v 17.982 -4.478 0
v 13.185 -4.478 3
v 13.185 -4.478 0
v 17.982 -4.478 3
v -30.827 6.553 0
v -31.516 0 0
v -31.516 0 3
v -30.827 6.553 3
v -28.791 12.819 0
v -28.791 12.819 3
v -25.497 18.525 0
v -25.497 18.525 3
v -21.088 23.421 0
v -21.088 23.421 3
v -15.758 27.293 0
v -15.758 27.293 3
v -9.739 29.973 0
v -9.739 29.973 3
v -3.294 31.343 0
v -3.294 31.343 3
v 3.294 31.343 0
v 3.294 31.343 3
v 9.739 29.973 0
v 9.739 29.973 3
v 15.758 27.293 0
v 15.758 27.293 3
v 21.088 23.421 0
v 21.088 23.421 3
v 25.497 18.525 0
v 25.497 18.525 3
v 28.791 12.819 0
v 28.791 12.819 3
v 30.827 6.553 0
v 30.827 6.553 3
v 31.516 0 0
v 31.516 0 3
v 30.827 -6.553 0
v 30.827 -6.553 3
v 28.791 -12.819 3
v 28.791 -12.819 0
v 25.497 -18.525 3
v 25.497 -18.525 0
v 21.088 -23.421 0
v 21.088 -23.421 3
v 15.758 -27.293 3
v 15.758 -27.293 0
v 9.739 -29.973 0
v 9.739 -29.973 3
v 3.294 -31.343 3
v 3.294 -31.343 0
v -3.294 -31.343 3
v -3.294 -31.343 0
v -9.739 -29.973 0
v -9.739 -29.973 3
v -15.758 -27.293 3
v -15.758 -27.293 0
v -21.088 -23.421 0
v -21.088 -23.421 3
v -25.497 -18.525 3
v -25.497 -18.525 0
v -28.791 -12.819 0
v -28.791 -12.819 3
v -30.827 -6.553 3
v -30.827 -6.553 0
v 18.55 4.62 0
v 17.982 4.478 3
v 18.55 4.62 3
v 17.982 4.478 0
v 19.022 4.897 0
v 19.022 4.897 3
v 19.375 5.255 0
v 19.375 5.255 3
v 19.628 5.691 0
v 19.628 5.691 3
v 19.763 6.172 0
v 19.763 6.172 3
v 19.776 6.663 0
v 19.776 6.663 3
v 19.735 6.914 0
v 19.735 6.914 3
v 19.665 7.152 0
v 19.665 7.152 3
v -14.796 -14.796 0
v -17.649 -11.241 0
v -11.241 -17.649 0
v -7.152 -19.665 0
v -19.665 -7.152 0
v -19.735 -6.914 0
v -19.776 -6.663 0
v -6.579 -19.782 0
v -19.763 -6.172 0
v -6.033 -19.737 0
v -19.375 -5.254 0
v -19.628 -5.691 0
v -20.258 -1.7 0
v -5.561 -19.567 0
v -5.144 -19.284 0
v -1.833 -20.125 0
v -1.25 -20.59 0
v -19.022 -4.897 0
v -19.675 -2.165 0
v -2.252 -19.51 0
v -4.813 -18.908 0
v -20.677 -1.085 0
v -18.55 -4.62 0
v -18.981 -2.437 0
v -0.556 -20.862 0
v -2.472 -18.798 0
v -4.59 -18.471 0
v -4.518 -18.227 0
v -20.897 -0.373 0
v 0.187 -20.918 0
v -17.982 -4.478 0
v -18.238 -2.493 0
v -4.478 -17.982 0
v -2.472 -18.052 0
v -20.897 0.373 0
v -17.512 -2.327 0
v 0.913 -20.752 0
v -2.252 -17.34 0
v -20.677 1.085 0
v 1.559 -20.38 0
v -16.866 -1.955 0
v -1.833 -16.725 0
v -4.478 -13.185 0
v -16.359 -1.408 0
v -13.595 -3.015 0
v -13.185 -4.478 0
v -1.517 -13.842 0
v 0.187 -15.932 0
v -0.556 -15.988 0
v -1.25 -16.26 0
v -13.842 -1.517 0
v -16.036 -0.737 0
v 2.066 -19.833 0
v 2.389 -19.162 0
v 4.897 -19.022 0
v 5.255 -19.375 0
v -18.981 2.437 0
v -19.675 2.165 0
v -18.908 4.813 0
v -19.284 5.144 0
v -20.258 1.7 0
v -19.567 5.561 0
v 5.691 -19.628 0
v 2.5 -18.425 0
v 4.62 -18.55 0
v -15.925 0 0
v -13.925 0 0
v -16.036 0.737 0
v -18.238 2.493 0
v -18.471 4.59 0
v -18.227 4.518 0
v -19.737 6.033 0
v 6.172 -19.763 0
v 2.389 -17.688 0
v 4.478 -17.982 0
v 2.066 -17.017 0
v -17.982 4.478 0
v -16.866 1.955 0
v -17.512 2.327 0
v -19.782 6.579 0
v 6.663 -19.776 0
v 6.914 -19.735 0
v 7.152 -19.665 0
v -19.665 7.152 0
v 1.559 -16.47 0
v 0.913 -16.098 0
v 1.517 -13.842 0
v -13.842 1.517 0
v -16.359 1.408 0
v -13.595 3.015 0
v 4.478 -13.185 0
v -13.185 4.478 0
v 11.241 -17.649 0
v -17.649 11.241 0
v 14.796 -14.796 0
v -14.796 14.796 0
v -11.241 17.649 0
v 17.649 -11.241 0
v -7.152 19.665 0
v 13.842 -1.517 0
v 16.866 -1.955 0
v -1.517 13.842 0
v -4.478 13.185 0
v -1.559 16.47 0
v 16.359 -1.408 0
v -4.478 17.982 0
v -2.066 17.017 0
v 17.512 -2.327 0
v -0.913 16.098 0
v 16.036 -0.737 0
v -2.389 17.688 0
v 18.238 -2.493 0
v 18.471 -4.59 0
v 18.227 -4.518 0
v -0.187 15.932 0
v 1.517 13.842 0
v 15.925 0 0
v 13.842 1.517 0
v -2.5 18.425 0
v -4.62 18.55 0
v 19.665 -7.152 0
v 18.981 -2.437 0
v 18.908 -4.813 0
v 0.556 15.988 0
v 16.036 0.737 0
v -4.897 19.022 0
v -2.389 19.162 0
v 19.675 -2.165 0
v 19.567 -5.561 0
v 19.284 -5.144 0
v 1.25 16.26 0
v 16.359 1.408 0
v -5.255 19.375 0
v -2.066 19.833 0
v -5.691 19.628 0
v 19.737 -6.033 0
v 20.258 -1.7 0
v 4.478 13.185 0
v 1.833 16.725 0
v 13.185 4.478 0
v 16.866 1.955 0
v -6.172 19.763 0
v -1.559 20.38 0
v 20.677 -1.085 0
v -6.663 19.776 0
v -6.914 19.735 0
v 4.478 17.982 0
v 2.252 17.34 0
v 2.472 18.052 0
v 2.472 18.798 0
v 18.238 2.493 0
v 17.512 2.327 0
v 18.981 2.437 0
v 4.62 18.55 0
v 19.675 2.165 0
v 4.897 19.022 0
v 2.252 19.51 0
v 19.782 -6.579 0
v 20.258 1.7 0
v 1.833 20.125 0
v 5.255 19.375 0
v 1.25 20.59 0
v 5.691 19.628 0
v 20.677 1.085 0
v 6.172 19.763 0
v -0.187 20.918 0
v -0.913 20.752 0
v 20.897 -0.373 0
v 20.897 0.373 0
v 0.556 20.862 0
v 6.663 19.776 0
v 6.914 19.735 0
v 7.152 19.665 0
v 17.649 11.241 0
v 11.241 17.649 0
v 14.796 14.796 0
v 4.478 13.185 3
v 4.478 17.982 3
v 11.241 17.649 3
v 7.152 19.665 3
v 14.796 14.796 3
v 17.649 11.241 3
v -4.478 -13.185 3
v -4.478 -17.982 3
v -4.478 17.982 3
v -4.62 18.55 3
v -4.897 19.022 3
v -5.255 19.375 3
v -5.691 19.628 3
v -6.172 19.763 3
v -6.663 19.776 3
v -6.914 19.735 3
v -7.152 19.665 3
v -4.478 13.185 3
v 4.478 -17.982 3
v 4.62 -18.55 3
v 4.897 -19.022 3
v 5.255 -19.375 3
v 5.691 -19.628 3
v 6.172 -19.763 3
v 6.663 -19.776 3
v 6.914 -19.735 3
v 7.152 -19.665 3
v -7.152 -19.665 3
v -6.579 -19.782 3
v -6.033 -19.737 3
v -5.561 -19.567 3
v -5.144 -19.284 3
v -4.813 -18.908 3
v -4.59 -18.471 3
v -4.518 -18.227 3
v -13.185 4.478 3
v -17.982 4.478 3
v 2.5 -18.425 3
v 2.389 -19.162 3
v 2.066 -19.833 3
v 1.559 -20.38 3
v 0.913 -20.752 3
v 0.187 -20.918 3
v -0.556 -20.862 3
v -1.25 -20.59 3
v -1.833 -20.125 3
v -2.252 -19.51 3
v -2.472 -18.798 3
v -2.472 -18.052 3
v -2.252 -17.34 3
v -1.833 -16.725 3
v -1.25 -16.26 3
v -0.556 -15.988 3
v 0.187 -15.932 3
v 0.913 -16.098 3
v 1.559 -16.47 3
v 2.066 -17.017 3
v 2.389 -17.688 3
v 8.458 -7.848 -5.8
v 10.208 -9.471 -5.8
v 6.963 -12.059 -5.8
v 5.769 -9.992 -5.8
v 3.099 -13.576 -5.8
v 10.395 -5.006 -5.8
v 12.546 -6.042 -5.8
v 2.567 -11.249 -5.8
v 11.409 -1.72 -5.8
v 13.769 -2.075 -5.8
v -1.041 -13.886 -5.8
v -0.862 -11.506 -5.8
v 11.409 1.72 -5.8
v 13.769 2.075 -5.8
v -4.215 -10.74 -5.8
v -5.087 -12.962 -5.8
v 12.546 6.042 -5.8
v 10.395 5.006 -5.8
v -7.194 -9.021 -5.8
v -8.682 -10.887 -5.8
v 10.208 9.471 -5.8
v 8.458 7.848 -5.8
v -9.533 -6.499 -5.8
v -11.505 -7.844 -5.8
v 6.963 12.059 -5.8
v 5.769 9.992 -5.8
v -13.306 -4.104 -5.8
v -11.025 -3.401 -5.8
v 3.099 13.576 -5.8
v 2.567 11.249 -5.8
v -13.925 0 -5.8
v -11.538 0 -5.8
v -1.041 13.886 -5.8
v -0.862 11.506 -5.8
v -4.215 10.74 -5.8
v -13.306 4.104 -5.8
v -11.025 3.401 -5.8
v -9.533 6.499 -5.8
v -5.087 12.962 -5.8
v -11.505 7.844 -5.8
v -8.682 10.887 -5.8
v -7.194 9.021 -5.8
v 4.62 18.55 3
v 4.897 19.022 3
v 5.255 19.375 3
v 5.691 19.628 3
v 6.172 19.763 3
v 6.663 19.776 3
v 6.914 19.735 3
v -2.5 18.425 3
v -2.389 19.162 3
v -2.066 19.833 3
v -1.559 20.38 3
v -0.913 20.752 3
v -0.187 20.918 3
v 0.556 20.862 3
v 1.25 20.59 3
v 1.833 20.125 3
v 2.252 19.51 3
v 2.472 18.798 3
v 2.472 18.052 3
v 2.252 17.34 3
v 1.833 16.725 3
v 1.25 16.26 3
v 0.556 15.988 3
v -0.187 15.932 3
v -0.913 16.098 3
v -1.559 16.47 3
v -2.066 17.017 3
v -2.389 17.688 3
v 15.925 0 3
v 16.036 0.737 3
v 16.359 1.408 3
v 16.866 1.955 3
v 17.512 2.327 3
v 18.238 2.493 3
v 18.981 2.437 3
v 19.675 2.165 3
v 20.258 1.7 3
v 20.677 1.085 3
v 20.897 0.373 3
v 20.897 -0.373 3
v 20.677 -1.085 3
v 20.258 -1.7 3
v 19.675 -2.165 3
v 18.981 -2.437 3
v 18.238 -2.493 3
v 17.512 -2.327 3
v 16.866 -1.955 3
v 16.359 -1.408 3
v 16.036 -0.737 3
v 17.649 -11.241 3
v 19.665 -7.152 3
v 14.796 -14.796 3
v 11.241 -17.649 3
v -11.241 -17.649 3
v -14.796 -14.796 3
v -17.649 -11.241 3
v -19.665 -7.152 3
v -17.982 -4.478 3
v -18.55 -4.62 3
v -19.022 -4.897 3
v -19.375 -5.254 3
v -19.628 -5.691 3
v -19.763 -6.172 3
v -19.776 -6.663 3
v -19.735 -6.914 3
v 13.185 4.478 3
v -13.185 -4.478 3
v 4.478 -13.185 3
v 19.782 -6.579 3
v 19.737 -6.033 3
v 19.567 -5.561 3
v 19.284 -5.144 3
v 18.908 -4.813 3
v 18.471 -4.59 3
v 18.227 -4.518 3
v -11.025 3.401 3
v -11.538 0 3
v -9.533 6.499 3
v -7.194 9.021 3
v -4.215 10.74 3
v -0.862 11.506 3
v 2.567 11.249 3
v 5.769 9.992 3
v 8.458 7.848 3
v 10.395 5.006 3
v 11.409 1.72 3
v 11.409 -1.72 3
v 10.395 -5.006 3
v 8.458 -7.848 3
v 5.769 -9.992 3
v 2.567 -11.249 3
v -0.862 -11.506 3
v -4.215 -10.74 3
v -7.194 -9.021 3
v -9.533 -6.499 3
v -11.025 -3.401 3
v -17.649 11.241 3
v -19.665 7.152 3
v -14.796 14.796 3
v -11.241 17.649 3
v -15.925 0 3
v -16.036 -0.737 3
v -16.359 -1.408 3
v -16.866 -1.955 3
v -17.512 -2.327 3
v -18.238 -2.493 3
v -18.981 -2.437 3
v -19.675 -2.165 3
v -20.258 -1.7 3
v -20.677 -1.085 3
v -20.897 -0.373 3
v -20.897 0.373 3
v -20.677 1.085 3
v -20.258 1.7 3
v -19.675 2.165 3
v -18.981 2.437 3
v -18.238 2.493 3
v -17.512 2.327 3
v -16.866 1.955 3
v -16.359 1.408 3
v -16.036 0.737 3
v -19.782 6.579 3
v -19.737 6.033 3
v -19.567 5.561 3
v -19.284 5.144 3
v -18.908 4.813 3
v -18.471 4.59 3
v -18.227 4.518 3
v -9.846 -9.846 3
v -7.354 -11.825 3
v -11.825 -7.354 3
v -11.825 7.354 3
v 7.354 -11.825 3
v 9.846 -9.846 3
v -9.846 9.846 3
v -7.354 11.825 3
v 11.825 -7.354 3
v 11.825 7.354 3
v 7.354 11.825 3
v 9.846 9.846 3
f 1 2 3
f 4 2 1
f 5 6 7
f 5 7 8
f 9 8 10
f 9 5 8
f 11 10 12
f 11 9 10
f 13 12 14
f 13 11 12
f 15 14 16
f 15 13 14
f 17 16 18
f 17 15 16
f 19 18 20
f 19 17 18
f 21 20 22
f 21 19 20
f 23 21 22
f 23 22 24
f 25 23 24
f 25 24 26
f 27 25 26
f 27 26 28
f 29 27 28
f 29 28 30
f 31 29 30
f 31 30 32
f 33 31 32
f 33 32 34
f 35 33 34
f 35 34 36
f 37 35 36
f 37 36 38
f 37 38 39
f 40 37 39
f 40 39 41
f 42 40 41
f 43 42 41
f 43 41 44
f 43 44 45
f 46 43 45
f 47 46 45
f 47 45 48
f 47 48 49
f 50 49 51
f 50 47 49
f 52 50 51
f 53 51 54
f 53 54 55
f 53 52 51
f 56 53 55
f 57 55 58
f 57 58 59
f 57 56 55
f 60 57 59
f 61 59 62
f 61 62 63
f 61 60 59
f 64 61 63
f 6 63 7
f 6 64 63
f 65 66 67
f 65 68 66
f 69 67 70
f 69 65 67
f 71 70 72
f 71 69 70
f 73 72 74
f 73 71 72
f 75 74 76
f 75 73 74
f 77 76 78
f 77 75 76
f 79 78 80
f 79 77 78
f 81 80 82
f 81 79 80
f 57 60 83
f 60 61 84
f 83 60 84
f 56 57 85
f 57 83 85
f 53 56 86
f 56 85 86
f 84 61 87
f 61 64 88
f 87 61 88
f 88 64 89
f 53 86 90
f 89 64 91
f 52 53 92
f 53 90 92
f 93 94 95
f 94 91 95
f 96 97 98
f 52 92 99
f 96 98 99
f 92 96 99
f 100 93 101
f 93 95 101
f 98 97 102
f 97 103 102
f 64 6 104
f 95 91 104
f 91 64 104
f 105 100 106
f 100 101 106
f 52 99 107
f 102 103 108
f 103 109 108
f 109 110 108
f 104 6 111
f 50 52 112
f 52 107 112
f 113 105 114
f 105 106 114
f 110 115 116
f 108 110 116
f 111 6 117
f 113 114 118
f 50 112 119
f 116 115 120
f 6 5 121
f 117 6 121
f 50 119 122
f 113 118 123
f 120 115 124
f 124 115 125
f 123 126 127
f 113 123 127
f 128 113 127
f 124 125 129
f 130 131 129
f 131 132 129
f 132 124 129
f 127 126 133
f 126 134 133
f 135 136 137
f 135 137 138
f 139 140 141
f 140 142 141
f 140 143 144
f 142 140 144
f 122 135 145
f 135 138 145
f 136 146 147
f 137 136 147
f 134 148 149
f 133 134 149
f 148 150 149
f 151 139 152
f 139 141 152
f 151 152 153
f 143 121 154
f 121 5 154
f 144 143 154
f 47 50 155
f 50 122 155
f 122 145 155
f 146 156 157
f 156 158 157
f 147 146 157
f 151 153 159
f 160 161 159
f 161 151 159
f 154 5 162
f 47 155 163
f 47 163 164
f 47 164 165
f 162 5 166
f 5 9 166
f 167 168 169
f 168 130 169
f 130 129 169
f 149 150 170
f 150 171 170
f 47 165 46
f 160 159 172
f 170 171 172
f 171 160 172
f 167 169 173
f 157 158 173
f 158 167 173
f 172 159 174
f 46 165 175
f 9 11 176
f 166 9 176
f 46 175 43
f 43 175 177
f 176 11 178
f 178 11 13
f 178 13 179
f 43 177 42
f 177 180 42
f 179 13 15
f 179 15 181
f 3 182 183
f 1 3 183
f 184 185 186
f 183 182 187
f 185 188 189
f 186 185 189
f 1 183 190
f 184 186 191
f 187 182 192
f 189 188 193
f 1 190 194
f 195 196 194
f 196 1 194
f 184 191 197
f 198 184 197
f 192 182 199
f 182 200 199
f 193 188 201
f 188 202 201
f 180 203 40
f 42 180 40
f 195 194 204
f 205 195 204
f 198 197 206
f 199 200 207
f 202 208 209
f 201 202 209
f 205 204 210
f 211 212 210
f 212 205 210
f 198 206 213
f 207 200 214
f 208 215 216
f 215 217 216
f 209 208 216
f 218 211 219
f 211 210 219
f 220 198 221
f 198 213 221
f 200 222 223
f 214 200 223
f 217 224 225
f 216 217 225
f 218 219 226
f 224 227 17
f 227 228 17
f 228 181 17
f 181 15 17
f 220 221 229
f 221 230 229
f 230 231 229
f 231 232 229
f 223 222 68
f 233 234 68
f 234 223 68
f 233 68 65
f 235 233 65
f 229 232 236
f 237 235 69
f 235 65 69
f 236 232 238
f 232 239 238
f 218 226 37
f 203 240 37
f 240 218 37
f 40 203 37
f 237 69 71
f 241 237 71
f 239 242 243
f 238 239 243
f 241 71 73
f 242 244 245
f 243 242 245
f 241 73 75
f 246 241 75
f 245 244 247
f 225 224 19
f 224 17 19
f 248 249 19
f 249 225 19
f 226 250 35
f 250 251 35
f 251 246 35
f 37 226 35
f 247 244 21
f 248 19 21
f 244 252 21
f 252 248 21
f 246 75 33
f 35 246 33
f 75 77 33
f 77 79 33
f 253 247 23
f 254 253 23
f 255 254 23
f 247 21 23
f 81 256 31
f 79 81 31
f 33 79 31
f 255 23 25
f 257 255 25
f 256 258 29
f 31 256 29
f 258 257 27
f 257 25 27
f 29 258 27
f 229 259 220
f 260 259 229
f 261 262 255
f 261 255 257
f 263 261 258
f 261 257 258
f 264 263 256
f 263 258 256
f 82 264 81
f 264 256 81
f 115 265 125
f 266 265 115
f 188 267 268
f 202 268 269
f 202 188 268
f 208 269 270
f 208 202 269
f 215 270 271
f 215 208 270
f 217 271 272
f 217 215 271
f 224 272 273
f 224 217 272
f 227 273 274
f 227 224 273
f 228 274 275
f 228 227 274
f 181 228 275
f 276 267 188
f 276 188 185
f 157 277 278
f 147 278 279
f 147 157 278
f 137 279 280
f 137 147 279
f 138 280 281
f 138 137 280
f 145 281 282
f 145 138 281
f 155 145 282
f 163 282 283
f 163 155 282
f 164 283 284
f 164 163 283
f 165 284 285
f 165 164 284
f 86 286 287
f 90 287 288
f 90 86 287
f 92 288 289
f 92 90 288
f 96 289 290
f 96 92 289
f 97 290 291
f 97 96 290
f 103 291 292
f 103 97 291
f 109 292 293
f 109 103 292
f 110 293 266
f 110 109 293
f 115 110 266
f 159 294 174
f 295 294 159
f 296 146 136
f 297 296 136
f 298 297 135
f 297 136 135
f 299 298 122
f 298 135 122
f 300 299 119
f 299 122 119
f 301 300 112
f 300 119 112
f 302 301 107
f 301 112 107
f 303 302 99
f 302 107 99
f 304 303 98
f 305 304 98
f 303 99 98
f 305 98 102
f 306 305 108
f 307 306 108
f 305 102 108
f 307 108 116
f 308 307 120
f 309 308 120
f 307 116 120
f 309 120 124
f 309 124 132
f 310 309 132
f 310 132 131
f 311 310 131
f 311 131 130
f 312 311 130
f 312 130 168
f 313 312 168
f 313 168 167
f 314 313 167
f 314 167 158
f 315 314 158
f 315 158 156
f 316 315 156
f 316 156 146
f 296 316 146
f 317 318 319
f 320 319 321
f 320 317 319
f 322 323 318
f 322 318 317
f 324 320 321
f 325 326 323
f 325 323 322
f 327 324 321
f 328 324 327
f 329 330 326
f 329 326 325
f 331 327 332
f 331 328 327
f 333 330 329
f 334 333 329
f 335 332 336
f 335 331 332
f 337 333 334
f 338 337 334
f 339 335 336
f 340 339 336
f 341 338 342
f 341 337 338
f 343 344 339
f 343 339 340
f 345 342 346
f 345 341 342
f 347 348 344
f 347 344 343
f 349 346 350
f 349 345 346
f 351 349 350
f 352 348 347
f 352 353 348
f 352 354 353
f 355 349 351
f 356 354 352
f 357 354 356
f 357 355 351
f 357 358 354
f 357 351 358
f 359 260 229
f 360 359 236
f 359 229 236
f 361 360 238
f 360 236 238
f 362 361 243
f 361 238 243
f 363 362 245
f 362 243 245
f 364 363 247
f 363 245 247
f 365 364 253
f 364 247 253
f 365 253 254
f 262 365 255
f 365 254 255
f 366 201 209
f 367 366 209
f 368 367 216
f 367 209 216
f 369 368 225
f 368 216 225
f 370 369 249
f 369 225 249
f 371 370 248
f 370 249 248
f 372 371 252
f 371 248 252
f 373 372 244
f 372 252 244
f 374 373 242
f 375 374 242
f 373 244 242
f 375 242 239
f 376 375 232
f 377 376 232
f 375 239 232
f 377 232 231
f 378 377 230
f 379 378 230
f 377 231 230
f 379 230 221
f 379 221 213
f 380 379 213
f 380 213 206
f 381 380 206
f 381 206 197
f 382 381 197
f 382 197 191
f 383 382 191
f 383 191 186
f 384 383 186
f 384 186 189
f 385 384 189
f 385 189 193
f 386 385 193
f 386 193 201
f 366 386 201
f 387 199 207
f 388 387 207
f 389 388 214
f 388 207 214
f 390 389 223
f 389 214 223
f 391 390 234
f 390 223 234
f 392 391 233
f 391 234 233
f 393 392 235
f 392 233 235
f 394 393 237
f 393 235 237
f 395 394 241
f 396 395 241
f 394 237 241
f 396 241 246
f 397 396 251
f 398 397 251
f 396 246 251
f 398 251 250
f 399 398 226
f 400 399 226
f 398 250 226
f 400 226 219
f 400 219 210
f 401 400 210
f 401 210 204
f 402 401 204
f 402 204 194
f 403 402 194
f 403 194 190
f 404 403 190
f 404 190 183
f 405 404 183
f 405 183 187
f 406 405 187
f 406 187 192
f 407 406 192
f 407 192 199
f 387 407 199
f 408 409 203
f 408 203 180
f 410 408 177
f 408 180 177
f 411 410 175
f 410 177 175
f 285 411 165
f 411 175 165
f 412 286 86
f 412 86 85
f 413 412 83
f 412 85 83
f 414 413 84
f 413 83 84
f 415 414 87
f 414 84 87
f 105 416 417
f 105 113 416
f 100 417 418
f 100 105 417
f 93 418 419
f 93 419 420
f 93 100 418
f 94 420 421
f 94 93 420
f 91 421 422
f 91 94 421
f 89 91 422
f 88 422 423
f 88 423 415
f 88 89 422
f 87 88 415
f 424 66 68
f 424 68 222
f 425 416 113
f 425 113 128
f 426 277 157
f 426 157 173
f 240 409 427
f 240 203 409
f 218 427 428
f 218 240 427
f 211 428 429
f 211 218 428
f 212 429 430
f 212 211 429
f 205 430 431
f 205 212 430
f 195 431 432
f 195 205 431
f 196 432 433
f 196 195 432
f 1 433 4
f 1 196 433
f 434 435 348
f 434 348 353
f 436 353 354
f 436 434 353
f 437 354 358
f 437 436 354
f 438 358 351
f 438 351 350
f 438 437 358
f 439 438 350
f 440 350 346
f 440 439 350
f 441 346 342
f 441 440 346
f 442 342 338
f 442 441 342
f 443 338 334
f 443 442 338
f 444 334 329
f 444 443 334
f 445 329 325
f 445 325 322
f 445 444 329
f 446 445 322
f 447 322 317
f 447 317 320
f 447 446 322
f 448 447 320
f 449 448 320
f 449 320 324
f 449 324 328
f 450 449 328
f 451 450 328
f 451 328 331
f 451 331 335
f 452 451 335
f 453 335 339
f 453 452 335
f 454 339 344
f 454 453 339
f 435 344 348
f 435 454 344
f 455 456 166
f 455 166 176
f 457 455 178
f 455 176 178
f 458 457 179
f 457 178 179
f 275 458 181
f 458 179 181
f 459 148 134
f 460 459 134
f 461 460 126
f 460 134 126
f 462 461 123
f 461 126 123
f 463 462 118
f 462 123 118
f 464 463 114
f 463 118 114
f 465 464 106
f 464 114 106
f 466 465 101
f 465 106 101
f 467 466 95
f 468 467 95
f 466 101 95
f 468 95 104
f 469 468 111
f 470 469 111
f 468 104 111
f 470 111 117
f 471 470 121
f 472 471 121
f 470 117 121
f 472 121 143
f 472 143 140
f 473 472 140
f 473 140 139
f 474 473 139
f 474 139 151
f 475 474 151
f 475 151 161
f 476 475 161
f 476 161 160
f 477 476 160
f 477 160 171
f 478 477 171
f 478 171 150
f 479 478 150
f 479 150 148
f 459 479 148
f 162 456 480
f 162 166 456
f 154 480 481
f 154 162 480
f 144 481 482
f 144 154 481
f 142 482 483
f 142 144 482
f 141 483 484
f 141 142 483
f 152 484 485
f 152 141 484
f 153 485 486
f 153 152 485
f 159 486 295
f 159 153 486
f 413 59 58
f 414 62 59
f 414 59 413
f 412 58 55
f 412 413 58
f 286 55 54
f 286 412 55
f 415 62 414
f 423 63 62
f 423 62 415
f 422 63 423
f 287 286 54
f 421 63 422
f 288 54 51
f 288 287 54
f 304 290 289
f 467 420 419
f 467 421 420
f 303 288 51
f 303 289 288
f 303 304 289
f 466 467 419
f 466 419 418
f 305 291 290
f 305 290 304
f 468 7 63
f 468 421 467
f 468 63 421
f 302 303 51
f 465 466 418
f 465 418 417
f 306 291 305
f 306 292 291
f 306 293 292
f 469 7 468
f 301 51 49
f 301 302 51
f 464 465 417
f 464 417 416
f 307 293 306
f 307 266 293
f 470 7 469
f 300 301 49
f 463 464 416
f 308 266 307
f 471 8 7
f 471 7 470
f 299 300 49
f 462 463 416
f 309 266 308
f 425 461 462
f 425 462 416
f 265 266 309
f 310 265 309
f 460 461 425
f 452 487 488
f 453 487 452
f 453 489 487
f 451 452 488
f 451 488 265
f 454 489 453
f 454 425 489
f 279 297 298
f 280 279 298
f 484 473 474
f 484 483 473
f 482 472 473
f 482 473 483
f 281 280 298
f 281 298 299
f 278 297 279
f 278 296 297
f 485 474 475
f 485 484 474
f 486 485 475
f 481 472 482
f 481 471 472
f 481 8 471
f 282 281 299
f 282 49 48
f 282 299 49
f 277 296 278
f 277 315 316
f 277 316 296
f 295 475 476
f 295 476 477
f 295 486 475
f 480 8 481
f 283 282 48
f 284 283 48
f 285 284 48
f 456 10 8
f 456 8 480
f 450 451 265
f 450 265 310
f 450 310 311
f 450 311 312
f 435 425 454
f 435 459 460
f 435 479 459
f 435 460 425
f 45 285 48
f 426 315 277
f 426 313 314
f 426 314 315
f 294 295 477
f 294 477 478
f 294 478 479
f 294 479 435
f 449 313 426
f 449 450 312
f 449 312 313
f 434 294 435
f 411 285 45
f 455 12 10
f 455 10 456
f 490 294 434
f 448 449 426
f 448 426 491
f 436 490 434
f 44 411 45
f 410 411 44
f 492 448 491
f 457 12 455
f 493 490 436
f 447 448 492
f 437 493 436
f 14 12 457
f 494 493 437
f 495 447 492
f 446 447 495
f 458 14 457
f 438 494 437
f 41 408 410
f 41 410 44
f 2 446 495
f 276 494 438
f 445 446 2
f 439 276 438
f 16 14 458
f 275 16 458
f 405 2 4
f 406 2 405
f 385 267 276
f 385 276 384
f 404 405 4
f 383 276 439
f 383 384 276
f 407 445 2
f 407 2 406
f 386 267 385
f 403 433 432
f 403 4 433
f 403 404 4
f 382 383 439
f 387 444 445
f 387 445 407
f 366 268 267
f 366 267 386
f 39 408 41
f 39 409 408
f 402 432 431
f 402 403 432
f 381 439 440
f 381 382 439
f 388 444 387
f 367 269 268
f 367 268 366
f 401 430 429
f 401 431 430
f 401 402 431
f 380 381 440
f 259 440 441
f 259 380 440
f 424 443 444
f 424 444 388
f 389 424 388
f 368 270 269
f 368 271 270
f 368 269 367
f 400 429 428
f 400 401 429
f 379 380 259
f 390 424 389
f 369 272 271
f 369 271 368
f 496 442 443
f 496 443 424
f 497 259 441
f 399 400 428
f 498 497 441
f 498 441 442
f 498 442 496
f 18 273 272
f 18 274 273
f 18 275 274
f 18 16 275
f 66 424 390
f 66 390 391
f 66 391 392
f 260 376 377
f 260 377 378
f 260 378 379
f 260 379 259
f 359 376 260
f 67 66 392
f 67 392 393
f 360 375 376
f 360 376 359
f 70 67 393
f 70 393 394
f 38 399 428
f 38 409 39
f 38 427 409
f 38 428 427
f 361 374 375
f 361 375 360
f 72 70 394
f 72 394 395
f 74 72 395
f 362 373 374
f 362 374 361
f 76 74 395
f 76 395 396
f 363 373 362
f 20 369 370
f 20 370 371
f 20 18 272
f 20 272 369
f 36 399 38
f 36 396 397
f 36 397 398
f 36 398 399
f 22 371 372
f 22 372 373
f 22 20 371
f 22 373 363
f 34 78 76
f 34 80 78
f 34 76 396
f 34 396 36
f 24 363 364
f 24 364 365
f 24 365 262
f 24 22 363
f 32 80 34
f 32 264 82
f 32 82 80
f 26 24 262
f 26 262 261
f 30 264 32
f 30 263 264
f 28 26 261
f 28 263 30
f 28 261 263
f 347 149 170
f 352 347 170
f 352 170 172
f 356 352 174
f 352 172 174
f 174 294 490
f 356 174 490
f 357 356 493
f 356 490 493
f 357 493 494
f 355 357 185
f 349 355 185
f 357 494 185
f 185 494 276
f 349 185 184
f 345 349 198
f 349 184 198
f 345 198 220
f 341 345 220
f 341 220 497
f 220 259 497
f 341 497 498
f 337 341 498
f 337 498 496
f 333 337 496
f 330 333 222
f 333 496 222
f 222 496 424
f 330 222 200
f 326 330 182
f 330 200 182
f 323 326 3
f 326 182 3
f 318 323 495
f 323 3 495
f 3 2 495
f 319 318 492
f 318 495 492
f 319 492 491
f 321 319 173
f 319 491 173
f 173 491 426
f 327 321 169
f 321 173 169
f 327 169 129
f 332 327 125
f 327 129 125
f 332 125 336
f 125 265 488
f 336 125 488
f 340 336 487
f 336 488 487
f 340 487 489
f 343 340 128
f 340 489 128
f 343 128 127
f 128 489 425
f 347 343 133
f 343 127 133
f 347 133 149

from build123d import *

# Parameters (mm, degrees)
SKETCH2_R                = 52.5
SKETCH2_R_2              = 4.1
BOSS_EXTRUDE1_DEPTH      = 3
SKETCH3_R                = 20.925
CUT_EXTRUDE1_DEPTH       = 9
SKETCH4_R                = 4.5
SKETCH4_R_2              = 2.5
BOSS_EXTRUDE2_DEPTH      = 3
FILLET1_R                = 2
SKETCH5_R                = 52.5
SKETCH5_R_2              = 31.515813439
CUT_EXTRUDE2_DEPTH       = 11.8
BOSS_EXTRUDE3_DEPTH      = 5.8
BOSS_EXTRUDE3_DEPTH_BACK = 3
SKETCH6_R                = 13.925
SKETCH6_R_2              = 11.537787208
BOSS_EXTRUDE4_DEPTH      = 3


with BuildPart() as part:
    # Sketch2 → Boss-Extrude1 (new body)
    with BuildSketch(Plane.XY):
        Circle(SKETCH2_R)
        with Locations((0, 44)):
            Circle(SKETCH2_R_2, mode=Mode.SUBTRACT)
        with Locations((38.105117767, -22)):
            Circle(SKETCH2_R_2, mode=Mode.SUBTRACT)
        with Locations((-38.105117767, -22)):
            Circle(SKETCH2_R_2, mode=Mode.SUBTRACT)
        Polygon((0, 20.207259422), (-17.5, 10.103629711), (-17.5, -10.103629711), (0, -20.207259422), (17.5, -10.103629711), (17.5, 10.103629711), align=None, mode=Mode.SUBTRACT)
    extrude(amount=BOSS_EXTRUDE1_DEPTH)

    # Sketch3 → Cut-Extrude1 (cut)
    with BuildSketch(Plane(origin=(0, 0, 0), x_dir=(-1, 0, 0), z_dir=(0, 0, -1))):
        Circle(SKETCH3_R)
    extrude(amount=-CUT_EXTRUDE1_DEPTH, mode=Mode.SUBTRACT)

    # Sketch4 → Boss-Extrude2 (add)
    # profile 1 of 4: a face of its own
    with BuildSketch(Plane(origin=(0, 0, 0), x_dir=(-1, 0, 0), z_dir=(0, 0, -1))):
        with Locations((0, 18.425)):
            Circle(SKETCH4_R)
        with Locations((0, 18.425)):
            Circle(SKETCH4_R_2, mode=Mode.SUBTRACT)
    # profile 2 of 4: a face of its own
    with BuildSketch(Plane(origin=(0, 0, 0), x_dir=(-1, 0, 0), z_dir=(0, 0, -1))):
        with Locations((-18.425, 0)):
            Circle(SKETCH4_R)
        with Locations((-18.425, 0)):
            Circle(SKETCH4_R_2, mode=Mode.SUBTRACT)
    # profile 3 of 4: a face of its own
    with BuildSketch(Plane(origin=(0, 0, 0), x_dir=(-1, 0, 0), z_dir=(0, 0, -1))):
        with Locations((0, -18.425)):
            Circle(SKETCH4_R)
        with Locations(Location((0, -18.425, 0), (0, 0, 180))):
            Circle(SKETCH4_R_2, mode=Mode.SUBTRACT)
    # profile 4 of 4: a face of its own
    with BuildSketch(Plane(origin=(0, 0, 0), x_dir=(-1, 0, 0), z_dir=(0, 0, -1))):
        with Locations((18.425, 0)):
            Circle(SKETCH4_R)
        with Locations(Location((18.425, 0, 0), (0, 0, 180))):
            Circle(SKETCH4_R_2, mode=Mode.SUBTRACT)
    extrude(amount=-BOSS_EXTRUDE2_DEPTH)

    # Fillet1
    fillet1_edges = [part.edges().sort_by_distance(p)[0] for p in [
        (-3.969288955, 20.545081411, 1.5),
        (3.969288955, 20.545081411, 1.5),
        (20.545081411, 3.969288955, 1.5),
        (20.545081411, -3.969288955, 1.5),
        (3.969288955, -20.545081411, 1.5),
        (-3.969288955, -20.545081411, 1.5),
        (-20.545081411, -3.969288955, 1.5),
        (-20.545081411, 3.969288955, 1.5),
    ]]
    fillet(fillet1_edges, radius=FILLET1_R)

    # Sketch5 → Cut-Extrude2 (cut)
    with BuildSketch(Plane(origin=(0, 0, 0), x_dir=(-1, 0, 0), z_dir=(0, 0, -1))):
        Circle(SKETCH5_R)
        Circle(SKETCH5_R_2, mode=Mode.SUBTRACT)
    extrude(amount=-CUT_EXTRUDE2_DEPTH, mode=Mode.SUBTRACT)



with BuildPart() as body_2:
    # Sketch6 → Boss-Extrude3 (new, two sides: drawn at the far end of the back side and taken through both)
    with BuildSketch(Plane(origin=(0, 0, 0), x_dir=(-1, 0, 0), z_dir=(0, 0, -1)).offset(-BOSS_EXTRUDE3_DEPTH_BACK)):
        Circle(SKETCH6_R)
        Circle(SKETCH6_R_2, mode=Mode.SUBTRACT)
    extrude(amount=BOSS_EXTRUDE3_DEPTH + BOSS_EXTRUDE3_DEPTH_BACK)


with BuildPart() as part_1:
    add(part.part)

    add(body_2.part)  # Boss-Extrude4 merges body 2
    # Sketch7 → Boss-Extrude4 (add)
    with BuildSketch(Plane.XY.offset(3)):
        Polygon((17.982092162, 4.478150583), (13.185286965, 4.478150583), (13.185286965, -4.478150583), (17.982092162, -4.478150583), (17.982092162, -3.600432721), (16.459783373, -2.648989728), (15.103112387, -1.801070362), (15.103112387, 0.78355996), (16.060382876, 2.315192743), (17.5, 3.192690691), align=None)
        Polygon((4.478150583, -17.982092162), (4.478150583, -13.185286965), (-4.478150583, -13.185286965), (-4.478150583, -17.982092162), (-3.600432721, -17.982092162), (-2.648989728, -16.459783373), (-1.801070362, -15.103112387), (0.78355996, -15.103112387), (2.315192743, -16.060382876), (3.192690691, -17.5), align=None)
        Polygon((-17.982092162, -4.478150583), (-13.185286965, -4.478150583), (-13.185286965, 4.478150583), (-17.982092162, 4.478150583), (-17.982092162, 3.600432721), (-16.459783373, 2.648989728), (-15.103112387, 1.801070362), (-15.103112387, -0.78355996), (-16.060382876, -2.315192743), (-17.5, -3.192690691), align=None)
        Polygon((-4.478150583, 17.982092162), (-4.478150583, 13.185286965), (4.478150583, 13.185286965), (4.478150583, 17.982092162), (3.600432721, 17.982092162), (2.648989728, 16.459783373), (1.801070362, 15.103112387), (-0.78355996, 15.103112387), (-2.315192743, 16.060382876), (-3.192690691, 17.5), align=None)
    extrude(amount=-BOSS_EXTRUDE4_DEPTH)


solid = part_1.part
